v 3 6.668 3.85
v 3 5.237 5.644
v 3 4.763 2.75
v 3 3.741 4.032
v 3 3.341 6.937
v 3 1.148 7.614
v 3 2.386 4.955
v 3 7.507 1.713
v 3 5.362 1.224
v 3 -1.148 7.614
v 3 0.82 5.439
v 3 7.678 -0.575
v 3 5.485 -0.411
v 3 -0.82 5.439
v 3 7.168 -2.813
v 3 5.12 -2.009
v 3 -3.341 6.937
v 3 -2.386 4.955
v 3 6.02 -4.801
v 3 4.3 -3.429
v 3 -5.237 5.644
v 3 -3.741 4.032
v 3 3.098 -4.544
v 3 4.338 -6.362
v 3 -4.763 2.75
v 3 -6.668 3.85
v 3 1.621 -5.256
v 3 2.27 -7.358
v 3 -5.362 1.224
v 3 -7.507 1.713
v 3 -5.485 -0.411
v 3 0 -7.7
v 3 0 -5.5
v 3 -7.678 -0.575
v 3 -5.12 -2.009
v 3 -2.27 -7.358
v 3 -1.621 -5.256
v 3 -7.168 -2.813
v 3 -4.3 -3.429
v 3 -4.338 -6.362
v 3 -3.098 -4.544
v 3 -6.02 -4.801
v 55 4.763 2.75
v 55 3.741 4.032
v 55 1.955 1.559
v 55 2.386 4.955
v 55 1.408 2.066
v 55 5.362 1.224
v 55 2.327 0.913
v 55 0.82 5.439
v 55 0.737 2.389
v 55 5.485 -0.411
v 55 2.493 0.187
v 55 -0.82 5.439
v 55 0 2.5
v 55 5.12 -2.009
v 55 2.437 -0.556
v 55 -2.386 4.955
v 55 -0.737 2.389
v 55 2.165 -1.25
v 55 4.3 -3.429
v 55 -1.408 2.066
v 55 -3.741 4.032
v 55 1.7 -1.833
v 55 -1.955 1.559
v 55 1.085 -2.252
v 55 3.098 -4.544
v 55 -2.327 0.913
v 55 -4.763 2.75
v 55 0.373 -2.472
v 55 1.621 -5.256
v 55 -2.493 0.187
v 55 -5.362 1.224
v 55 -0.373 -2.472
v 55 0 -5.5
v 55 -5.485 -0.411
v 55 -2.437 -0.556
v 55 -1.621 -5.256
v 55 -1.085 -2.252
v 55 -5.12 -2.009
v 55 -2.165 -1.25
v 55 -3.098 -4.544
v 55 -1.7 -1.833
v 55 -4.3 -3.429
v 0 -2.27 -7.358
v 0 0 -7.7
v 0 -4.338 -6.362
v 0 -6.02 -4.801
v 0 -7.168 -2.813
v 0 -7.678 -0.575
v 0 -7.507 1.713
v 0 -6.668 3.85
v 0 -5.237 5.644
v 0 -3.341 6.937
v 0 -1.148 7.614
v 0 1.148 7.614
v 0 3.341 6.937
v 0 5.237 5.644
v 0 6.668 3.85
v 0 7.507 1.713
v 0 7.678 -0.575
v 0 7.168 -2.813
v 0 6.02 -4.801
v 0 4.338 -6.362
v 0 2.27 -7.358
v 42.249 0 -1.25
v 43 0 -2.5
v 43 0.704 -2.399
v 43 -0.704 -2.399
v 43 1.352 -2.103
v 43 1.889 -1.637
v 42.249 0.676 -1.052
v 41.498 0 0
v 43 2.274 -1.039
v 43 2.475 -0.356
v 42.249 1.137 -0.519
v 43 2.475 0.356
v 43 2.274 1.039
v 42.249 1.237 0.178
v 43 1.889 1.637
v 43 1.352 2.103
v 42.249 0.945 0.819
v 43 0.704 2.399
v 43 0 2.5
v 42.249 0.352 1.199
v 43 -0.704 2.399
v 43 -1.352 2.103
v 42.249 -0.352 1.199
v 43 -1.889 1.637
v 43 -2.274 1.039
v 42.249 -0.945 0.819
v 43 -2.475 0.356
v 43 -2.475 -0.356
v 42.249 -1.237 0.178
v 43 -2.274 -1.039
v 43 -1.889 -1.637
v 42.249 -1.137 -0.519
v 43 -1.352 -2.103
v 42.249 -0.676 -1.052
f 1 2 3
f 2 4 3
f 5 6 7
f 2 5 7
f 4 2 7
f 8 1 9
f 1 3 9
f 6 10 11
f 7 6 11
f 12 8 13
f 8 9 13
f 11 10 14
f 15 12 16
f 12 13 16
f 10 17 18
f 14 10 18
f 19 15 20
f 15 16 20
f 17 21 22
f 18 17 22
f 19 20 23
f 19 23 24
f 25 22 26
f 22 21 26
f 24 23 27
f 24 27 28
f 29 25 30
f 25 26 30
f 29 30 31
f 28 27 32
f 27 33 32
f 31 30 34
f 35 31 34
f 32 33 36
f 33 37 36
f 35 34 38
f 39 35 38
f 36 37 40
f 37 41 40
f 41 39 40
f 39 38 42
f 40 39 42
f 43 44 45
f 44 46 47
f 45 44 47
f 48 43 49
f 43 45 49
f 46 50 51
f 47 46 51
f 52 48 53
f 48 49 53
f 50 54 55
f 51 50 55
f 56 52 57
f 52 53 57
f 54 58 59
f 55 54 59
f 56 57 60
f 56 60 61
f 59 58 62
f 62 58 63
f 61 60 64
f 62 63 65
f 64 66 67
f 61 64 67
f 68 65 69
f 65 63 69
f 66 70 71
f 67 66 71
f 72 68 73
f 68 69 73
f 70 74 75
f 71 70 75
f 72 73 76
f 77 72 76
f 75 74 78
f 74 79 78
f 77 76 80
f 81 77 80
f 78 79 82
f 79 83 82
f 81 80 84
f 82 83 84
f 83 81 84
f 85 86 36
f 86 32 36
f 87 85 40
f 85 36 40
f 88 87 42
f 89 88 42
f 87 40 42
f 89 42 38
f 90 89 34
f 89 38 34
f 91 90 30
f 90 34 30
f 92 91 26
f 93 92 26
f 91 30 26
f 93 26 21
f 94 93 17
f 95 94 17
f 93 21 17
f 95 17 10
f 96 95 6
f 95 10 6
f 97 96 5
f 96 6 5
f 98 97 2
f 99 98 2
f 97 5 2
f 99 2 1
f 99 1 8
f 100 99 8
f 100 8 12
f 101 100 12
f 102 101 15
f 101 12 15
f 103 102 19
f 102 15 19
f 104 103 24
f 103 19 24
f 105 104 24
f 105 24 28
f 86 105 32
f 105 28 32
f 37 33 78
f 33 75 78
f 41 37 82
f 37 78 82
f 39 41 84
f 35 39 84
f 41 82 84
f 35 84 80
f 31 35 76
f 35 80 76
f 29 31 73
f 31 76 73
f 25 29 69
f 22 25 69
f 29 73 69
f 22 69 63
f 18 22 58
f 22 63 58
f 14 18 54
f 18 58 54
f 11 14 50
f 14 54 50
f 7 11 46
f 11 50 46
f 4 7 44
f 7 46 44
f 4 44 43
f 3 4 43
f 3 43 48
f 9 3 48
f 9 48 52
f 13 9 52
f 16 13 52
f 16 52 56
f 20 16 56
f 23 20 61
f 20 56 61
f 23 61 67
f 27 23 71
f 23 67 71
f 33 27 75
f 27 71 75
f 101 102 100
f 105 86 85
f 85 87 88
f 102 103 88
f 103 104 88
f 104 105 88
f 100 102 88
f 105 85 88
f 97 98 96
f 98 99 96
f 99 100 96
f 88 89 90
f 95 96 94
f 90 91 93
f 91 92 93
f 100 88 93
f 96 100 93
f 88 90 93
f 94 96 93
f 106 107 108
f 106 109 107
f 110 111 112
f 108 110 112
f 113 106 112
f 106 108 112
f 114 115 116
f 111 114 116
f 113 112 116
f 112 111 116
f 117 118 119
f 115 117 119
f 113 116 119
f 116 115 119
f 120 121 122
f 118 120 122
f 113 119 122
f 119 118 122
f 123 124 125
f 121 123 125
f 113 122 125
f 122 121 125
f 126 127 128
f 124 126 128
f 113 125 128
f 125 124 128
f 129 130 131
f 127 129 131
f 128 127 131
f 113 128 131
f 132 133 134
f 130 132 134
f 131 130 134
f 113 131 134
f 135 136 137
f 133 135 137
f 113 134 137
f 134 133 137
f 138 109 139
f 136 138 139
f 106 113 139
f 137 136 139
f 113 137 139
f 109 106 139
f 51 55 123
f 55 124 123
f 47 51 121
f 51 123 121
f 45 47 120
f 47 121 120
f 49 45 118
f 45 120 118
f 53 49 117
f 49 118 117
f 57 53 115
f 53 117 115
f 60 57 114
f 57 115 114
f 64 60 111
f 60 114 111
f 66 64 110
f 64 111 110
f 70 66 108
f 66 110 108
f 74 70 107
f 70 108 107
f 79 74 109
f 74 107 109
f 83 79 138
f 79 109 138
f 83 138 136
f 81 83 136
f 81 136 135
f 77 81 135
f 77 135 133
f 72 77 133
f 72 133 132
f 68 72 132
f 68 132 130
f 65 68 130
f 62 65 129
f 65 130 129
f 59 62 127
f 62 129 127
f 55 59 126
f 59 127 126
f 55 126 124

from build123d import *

# Parameters (mm, degrees)
BROCA_DE_ROSQUEAR_PARA_TARRAXA_DE_M61_D     = 5
BROCA_DE_ROSQUEAR_PARA_TARRAXA_DE_M61_DEPTH = 12
BROCA_DE_ROSQUEAR_PARA_TARRAXA_DE_M61_TIP   = 1.502151548


with BuildPart() as part:
    # Sketch1 → Revolve1 (revolve)
    with BuildSketch(Plane.XY, mode=Mode.PRIVATE) as revolve1_sk:
        Polygon((0, 0), (0, 7.7), (3, 7.7), (3, 5.5), (55, 5.5), (55, 0), align=None)
    revolve(revolve1_sk.sketch.rotate(Axis((0, 0, 0), (-1, 0, 0)), 90), axis=Axis((0, 0, 0), (-1, 0, 0)))

    # Broca de rosquear para tarraxa de M61
    with Locations(Plane(origin=(55, 0, 0), x_dir=(0, 0, -1), z_dir=(1, 0, 0))):
        with Locations((0, 0)):
            Hole(BROCA_DE_ROSQUEAR_PARA_TARRAXA_DE_M61_D / 2, depth=BROCA_DE_ROSQUEAR_PARA_TARRAXA_DE_M61_DEPTH)
            with Locations((0, 0, -(BROCA_DE_ROSQUEAR_PARA_TARRAXA_DE_M61_DEPTH + BROCA_DE_ROSQUEAR_PARA_TARRAXA_DE_M61_TIP / 2))):  # 118° drill point
                Cone(0, BROCA_DE_ROSQUEAR_PARA_TARRAXA_DE_M61_D / 2, BROCA_DE_ROSQUEAR_PARA_TARRAXA_DE_M61_TIP, mode=Mode.SUBTRACT)


solid = part.part
